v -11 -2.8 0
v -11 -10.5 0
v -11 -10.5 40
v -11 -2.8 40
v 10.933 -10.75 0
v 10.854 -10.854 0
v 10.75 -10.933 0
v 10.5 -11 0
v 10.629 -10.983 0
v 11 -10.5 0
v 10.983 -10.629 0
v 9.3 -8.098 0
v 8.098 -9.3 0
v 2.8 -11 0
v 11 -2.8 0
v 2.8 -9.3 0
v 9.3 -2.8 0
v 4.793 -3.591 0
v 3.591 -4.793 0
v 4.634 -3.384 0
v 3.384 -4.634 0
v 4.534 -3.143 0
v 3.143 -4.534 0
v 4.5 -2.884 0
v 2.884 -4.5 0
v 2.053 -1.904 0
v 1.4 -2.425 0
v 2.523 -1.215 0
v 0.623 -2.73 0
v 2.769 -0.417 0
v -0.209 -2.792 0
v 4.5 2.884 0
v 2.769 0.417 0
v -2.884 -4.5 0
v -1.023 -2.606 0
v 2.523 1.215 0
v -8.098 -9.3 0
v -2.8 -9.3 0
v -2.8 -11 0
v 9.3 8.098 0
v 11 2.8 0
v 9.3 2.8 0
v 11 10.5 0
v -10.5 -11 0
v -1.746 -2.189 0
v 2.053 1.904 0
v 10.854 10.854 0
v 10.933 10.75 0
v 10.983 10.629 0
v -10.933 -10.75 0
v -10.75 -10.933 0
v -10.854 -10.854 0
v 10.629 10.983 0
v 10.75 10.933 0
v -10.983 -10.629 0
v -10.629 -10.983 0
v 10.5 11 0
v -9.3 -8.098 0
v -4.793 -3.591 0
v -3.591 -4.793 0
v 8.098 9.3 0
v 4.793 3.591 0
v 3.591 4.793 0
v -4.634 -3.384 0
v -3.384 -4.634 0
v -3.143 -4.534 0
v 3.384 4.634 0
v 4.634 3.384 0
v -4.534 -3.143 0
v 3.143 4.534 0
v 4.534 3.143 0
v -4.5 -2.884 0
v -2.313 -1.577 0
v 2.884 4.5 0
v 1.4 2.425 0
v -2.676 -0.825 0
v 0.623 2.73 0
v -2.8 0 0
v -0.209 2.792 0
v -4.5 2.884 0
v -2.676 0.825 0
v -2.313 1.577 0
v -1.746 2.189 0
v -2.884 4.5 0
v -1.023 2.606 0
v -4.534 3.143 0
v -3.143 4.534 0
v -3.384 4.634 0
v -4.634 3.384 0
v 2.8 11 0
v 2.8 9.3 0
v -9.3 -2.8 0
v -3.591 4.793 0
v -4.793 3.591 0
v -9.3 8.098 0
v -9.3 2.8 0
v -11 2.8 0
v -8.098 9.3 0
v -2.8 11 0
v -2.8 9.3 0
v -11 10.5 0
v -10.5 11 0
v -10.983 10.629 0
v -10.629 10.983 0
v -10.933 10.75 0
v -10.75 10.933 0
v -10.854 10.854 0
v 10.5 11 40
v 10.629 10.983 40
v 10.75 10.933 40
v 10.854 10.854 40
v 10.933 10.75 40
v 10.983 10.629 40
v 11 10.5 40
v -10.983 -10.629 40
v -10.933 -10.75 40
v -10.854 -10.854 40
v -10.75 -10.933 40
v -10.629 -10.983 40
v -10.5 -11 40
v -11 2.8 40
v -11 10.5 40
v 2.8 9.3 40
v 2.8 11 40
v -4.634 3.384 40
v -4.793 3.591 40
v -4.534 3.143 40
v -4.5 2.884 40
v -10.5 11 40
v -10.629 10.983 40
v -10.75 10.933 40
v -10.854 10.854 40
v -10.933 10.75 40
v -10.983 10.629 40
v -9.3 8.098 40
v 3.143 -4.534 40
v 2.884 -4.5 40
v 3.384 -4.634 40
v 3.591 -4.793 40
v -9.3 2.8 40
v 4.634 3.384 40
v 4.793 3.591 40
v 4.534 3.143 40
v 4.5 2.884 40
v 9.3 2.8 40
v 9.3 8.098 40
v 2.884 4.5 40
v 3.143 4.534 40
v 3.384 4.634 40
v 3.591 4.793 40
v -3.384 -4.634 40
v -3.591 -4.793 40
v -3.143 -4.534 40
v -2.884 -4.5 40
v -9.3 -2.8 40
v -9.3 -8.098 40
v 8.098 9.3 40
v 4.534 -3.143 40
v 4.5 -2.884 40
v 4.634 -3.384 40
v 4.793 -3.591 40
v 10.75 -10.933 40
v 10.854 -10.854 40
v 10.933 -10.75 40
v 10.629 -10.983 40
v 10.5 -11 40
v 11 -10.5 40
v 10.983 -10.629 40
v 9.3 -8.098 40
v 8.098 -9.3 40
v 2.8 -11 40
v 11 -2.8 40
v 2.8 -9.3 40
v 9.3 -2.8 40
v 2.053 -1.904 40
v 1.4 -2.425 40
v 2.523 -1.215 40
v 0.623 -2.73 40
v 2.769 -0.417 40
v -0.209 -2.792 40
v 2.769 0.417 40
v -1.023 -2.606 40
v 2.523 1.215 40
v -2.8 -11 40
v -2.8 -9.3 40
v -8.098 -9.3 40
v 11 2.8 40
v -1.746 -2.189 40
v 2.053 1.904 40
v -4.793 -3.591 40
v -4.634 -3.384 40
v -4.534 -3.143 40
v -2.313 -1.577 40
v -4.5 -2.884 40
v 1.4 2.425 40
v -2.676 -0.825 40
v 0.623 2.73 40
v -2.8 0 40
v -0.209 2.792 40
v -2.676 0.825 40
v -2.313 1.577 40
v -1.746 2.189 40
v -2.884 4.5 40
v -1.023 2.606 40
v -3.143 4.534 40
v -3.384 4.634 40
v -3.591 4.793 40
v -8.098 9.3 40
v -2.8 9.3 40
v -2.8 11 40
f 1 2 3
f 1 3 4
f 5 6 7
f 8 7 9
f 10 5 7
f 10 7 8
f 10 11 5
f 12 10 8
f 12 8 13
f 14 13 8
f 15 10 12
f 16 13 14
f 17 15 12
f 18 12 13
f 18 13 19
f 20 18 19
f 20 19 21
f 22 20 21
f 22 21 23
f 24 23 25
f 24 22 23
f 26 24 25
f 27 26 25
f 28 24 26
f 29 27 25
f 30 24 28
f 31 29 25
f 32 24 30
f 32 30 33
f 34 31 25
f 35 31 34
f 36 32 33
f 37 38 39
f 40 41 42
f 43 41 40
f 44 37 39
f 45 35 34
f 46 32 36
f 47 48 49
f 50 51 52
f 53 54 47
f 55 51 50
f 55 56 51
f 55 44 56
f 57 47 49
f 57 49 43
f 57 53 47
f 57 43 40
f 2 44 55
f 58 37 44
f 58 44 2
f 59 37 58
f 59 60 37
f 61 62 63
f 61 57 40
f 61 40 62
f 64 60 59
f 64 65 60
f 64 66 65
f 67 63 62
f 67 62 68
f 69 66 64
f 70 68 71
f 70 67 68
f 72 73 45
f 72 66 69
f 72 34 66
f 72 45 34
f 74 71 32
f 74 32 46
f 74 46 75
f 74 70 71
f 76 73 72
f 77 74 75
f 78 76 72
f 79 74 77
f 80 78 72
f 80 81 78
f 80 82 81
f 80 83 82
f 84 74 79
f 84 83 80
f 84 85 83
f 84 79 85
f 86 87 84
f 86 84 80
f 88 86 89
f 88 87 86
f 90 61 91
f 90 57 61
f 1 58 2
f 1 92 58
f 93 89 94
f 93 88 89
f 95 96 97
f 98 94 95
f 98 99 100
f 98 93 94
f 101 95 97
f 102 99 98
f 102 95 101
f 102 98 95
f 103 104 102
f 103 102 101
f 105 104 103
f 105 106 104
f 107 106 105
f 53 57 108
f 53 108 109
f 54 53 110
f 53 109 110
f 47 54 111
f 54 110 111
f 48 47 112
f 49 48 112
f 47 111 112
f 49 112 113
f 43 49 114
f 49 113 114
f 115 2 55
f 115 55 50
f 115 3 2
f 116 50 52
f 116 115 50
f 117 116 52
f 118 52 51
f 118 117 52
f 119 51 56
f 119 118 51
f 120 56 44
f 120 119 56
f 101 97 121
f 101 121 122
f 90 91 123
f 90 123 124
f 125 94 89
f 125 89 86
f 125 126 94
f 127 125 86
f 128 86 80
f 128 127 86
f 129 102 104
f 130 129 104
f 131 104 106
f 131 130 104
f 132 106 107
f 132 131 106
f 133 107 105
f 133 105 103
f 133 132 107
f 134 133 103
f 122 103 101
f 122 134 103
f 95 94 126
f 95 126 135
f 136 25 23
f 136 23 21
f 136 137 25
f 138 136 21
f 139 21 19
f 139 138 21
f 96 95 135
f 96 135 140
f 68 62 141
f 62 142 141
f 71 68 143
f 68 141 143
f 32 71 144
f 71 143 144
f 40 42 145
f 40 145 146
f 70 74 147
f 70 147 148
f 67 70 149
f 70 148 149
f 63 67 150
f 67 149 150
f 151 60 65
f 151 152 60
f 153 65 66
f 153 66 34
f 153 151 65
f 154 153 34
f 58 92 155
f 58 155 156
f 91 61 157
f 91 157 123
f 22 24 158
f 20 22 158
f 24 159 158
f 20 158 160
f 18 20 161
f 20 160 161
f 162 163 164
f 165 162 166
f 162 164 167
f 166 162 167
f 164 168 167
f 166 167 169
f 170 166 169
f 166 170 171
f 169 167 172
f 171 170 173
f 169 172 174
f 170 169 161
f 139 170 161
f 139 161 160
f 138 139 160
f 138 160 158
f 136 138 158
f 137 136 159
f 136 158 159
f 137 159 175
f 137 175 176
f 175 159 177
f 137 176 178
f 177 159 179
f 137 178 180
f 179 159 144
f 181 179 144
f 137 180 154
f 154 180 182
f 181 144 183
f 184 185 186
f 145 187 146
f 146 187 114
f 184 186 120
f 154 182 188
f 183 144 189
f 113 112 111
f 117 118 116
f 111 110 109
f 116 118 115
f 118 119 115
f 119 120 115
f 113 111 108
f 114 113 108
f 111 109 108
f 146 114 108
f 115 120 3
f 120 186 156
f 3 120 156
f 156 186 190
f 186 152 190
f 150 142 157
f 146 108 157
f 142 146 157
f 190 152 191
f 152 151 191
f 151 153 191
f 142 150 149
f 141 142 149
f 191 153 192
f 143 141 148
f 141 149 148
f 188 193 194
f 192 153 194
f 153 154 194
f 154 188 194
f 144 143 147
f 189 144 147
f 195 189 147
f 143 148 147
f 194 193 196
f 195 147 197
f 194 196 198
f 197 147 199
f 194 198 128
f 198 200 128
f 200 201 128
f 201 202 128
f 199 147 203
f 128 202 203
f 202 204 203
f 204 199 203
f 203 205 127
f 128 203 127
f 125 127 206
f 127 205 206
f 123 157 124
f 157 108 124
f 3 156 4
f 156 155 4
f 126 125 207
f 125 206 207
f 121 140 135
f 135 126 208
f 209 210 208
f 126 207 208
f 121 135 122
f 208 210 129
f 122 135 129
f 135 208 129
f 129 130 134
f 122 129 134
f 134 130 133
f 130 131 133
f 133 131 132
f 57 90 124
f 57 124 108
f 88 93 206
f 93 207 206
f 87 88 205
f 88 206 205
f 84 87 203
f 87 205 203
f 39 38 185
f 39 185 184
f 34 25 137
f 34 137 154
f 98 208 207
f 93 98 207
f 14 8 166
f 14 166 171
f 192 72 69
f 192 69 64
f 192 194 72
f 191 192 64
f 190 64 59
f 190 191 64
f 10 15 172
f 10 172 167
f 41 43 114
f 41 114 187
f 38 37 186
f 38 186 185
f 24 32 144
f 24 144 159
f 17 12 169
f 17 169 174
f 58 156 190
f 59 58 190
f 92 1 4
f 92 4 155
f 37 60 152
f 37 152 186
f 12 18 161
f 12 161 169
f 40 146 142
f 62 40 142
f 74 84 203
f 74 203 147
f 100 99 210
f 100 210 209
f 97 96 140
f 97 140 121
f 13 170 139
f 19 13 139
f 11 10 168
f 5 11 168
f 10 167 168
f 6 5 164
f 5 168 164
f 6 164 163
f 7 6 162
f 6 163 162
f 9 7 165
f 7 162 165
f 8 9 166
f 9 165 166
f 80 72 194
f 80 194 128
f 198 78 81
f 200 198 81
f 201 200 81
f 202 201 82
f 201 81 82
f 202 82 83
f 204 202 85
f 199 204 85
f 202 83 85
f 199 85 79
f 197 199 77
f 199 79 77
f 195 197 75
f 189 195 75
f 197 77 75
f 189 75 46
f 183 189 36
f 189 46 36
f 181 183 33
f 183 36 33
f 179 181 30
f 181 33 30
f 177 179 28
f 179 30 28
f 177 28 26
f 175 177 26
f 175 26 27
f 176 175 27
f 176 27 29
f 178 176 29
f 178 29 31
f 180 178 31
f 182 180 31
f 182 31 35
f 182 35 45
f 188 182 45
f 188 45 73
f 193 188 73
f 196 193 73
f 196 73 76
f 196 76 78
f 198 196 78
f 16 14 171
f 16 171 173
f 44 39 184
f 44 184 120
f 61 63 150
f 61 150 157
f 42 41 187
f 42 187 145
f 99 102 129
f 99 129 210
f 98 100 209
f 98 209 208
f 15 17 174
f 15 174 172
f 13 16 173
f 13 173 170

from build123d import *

# Parameters (mm, degrees)
EXTRUSION1_DEPTH        = 40
ESQUISSE2_R             = 2.8
ENL_V_MAT_EXTRU_1_DEPTH = 41
CONG_1_R                = 0.5
CONG_2_R                = 1


with BuildPart() as part:
    # Esquisse1 → Extrusion1 (new body)
    with BuildSketch(Plane.XY):
        Polygon((-2.8, 11), (-2.8, 9.3), (-8.097918472, 9.3), (-3.297918472, 4.5), (3.297918472, 4.5), (8.097918472, 9.3), (2.8, 9.3), (2.8, 11), (11, 11), (11, 2.8), (9.3, 2.8), (9.3, 8.097918472), (4.5, 3.297918472), (4.5, -3.297918472), (9.3, -8.097918472), (9.3, -2.8), (11, -2.8), (11, -11), (2.8, -11), (2.8, -9.3), (8.097918472, -9.3), (3.297918472, -4.5), (-3.297918472, -4.5), (-8.097918472, -9.3), (-2.8, -9.3), (-2.8, -11), (-11, -11), (-11, -2.8), (-9.3, -2.8), (-9.3, -8.097918472), (-4.5, -3.297918472), (-4.5, 3.297918472), (-9.3, 8.097918472), (-9.3, 2.8), (-11, 2.8), (-11, 11), align=None)
    extrude(amount=EXTRUSION1_DEPTH)

    # Esquisse2 → Enlèv. mat.-Extru.1 (cut, through all)
    with BuildSketch(Plane(origin=(0, 0, 0), x_dir=(-1, 0, 0), z_dir=(0, 0, -1))):
        Circle(ESQUISSE2_R)
    extrude(amount=-ENL_V_MAT_EXTRU_1_DEPTH, mode=Mode.SUBTRACT)

    # Congé1
    cong_1_edges = [part.edges().sort_by_distance(p)[0] for p in [
        (-11, 11, 20),
        (11, 11, 20),
        (11, -11, 20),
        (-11, -11, 20),
    ]]
    fillet(cong_1_edges, radius=CONG_1_R)

    # Congé2
    cong_2_edges = [part.edges().sort_by_distance(p)[0] for p in [
        (-4.5, -3.297918472, 20),
        (-4.5, 3.297918472, 20),
        (-3.297918472, 4.5, 20),
        (3.297918472, 4.5, 20),
        (4.5, 3.297918472, 20),
        (4.5, -3.297918472, 20),
        (3.297918472, -4.5, 20),
        (-3.297918472, -4.5, 20),
    ]]
    fillet(cong_2_edges, radius=CONG_2_R)


solid = part.part
